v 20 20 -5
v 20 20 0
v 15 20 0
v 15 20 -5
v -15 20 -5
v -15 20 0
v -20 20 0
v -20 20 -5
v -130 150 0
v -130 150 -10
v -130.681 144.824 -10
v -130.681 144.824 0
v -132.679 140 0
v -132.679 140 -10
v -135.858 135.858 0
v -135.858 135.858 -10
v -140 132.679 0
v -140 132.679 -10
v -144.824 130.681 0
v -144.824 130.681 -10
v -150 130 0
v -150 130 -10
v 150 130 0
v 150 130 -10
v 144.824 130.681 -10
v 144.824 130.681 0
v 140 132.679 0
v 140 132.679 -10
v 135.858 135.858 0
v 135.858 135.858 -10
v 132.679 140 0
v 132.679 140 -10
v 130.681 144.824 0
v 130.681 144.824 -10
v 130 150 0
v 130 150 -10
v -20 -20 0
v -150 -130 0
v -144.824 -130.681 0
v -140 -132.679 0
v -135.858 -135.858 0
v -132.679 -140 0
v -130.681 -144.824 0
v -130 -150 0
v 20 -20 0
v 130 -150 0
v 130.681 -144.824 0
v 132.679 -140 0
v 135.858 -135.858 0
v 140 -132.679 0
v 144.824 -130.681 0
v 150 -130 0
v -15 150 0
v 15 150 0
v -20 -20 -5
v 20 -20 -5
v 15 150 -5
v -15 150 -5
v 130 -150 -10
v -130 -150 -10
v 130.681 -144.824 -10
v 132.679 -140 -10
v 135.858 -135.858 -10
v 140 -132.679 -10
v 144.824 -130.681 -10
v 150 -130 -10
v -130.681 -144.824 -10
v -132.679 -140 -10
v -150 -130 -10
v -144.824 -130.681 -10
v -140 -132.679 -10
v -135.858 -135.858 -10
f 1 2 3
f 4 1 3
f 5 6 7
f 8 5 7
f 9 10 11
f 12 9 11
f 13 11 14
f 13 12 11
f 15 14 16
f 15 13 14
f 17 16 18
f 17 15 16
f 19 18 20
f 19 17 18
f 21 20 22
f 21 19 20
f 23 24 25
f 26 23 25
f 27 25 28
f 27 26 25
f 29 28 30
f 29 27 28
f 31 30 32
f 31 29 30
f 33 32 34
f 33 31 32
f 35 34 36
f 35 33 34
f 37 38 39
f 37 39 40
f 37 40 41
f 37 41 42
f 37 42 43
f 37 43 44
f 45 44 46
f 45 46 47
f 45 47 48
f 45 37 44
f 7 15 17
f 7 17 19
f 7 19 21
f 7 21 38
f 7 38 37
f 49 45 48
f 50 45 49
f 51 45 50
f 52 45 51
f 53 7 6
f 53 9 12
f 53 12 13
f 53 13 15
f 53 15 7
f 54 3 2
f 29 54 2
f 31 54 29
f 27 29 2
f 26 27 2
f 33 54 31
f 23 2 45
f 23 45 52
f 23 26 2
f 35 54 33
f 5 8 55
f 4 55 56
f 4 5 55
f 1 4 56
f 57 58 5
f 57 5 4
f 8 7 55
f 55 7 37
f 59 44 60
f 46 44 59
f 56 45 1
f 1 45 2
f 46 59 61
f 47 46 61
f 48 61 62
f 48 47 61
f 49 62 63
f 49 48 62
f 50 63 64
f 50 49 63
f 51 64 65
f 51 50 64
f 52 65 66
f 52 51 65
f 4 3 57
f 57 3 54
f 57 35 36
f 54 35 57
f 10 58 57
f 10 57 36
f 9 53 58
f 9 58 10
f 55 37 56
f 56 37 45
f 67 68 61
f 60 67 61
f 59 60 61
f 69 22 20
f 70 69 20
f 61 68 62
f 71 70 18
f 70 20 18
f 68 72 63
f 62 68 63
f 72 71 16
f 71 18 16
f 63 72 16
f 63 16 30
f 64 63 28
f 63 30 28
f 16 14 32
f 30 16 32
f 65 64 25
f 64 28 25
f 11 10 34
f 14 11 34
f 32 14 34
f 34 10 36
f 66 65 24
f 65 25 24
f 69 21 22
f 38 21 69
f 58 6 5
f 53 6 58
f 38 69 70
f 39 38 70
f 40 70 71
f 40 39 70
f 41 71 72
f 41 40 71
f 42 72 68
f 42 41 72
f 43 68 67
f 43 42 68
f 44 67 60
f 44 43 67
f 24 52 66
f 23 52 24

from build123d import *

# Parameters (mm, degrees)
F2_DEPTH = 10
F1_W     = 30
F1_H     = 130
F3_DEPTH = 5


with BuildPart() as f2:
    # F0 (on Top) → F2 (new body)
    with BuildSketch(Plane.XY):
        with BuildLine():
            Line((130, 150), (-130, 150))
            ThreePointArc((-130, 150), (-135.857864, 135.857864), (-150, 130))
            Line((-150, 130), (-150, -130))
            ThreePointArc((-150, -130), (-135.857864, -135.857864), (-130, -150))
            Line((-130, -150), (130, -150))
            ThreePointArc((130, -150), (135.857864, -135.857864), (150, -130))
            Line((150, -130), (150, 130))
            ThreePointArc((150, 130), (135.857864, 135.857864), (130, 150))
        make_face()
    extrude(amount=-F2_DEPTH)

    # F1 (on Top) → F3 (cut)
    with BuildSketch(Plane.XY):
        Polygon((-15, 20), (-20, 20), (-20, -20), (20, -20), (20, 20), (15, 20), align=None)
        with Locations((0, 85)):
            Rectangle(F1_W, F1_H)
    extrude(amount=-F3_DEPTH, mode=Mode.SUBTRACT)


solid = f2.part
